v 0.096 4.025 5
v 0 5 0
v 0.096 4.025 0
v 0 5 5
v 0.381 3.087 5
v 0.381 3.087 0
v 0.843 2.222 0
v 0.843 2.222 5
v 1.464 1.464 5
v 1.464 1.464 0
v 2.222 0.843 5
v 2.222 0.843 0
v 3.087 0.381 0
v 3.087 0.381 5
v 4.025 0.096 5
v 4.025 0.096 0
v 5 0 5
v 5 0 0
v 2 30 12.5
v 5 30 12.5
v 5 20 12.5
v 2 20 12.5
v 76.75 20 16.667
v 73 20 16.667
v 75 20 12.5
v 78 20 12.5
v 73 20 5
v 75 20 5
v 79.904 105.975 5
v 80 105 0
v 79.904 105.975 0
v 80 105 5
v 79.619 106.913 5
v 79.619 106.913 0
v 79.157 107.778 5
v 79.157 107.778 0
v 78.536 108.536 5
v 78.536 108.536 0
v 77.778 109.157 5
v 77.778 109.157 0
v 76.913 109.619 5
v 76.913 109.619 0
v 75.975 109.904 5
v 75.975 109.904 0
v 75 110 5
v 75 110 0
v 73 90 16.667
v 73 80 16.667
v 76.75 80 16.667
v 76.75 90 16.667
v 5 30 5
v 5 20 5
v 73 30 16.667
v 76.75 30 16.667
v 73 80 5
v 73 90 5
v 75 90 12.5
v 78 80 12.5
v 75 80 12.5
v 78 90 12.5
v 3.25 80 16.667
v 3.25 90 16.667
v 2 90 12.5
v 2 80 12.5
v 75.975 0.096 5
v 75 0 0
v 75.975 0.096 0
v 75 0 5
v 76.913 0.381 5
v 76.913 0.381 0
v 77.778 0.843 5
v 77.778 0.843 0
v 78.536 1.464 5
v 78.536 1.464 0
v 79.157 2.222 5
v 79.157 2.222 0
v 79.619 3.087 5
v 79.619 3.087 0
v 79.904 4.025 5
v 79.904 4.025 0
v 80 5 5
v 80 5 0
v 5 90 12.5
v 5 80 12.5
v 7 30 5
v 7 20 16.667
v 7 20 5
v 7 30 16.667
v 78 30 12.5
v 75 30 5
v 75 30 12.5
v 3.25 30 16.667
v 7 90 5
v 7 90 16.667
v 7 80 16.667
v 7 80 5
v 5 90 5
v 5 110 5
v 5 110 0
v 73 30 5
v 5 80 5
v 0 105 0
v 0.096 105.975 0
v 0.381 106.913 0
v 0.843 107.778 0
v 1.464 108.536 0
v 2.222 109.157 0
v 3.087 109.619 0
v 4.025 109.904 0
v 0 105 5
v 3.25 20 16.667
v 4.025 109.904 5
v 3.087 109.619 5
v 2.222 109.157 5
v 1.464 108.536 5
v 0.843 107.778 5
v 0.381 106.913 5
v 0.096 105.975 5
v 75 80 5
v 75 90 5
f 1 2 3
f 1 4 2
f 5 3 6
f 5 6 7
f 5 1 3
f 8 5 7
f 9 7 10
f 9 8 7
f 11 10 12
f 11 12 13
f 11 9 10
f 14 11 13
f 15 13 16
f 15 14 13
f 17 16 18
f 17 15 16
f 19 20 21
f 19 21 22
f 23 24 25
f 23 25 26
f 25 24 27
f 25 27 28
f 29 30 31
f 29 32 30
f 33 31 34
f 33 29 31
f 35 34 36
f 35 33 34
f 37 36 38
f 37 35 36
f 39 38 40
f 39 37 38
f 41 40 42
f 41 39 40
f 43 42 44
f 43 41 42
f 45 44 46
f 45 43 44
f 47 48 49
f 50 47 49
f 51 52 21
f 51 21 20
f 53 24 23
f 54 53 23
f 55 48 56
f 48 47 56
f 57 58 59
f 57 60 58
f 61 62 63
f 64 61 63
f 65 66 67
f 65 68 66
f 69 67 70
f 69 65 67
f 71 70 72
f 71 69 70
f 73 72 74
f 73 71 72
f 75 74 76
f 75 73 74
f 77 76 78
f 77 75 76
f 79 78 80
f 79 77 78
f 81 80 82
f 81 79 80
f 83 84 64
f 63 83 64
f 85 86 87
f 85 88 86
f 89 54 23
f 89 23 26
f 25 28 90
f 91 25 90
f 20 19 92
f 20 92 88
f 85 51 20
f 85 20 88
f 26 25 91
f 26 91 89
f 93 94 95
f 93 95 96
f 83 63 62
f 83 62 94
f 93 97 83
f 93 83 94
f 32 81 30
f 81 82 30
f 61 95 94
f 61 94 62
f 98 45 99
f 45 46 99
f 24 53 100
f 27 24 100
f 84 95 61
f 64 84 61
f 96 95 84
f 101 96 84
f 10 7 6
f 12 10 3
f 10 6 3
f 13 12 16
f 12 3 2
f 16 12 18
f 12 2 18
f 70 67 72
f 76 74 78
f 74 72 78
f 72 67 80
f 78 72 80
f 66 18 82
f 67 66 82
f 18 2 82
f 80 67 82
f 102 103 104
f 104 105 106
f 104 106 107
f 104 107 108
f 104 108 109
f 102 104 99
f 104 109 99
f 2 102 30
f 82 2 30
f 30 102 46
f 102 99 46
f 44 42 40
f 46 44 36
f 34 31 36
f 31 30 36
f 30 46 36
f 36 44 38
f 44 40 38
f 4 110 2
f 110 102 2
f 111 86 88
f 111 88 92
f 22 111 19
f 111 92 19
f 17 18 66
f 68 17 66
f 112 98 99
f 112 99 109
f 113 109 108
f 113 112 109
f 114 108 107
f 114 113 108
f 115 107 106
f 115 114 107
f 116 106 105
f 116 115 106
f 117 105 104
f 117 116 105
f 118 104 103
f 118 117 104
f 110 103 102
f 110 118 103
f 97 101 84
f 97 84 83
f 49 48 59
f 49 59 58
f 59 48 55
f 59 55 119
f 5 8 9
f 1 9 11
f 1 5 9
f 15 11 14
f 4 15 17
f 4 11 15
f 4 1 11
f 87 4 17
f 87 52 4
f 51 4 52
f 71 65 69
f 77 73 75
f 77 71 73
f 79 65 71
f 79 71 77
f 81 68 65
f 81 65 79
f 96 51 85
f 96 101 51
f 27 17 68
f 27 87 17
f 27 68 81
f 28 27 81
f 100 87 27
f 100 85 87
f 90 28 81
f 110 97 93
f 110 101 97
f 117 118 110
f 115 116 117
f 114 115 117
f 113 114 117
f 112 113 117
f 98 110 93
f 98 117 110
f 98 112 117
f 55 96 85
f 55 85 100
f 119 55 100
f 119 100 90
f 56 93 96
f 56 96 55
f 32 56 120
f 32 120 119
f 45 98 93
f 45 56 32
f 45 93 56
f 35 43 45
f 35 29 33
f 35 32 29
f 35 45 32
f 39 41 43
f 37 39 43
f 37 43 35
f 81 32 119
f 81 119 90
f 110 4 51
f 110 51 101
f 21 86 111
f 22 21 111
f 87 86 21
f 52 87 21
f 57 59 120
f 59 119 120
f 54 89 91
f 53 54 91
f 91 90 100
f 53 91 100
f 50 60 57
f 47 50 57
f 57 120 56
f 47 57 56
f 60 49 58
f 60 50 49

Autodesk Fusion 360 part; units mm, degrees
sketch "Sketch1" plane through (0, 0, 0) normal (0, 0, 1) x (1, 0, 0)
  line L0 (0, 0) -> (80, 0)
  line L1 (80, 0) -> (80, 110)
  line L2 (80, 110) -> (0, 110)
  line L3 (0, 110) -> (0, 0)
  dimension "d1" = 80
  dimension "d2" = 110
extrude "Extrude1" add sketch "Sketch1" along normal blind 5
fillet "Fillet1" radius 5 4 edges at (80, 0, 2.5) (0, 0, 2.5) (80, 110, 2.5) (0, 110, 2.5)
sketch "Sketch2" plane through (0, 0, 5) normal (0, 0, 1) x (-1, 0, 0)
  arc A0 (-5, -110) -> (0, -105) centre (-5, -105) ccw
  line L0 (0, -105) -> (0, -5)
  arc A1 (0, -5) -> (-5, 0) centre (-5, -5) ccw
  line L1 (-5, 0) -> (-75, 0)
  arc A2 (-75, 0) -> (-80, -5) centre (-75, -5) ccw
  line L2 (-80, -5) -> (-80, -105)
  arc A3 (-80, -105) -> (-75, -110) centre (-75, -105) ccw
  line L3 (-75, -110) -> (-5, -110)
  line L4 (-5, -30) -> (-8, -30)
  line L5 (-8, -30) -> (-8, -20)
  line L6 (-8, -20) -> (-5, -20)
  line L7 (-5, -20) -> (-5, -30)
  line L8 (-5, -90) -> (-8, -90)
  line L9 (-8, -90) -> (-8, -80)
  line L10 (-8, -80) -> (-5, -80)
  line L11 (-5, -80) -> (-5, -90)
  line L12 (0, 0) -> (-40, 0)
  line L13 (-40, 0) -> (-40, -110)
  line L14 (-75, -90) -> (-72, -90)
  line L15 (-72, -90) -> (-72, -80)
  line L16 (-75, -80) -> (-75, -90)
  line L17 (-72, -80) -> (-75, -80)
  line L18 (-75, -30) -> (-72, -30)
  line L19 (-72, -20) -> (-75, -20)
  line L20 (-75, -20) -> (-75, -30)
  line L21 (-72, -30) -> (-72, -20)
  dimension "d7" = 3
  dimension "d8" = 10
  dimension "d9" = 3
  dimension "d10" = 10
  dimension "d11" = 5
  dimension "d12" = 5
  dimension "d13" = 20
  dimension "d14" = 20
  dimension "d15" = 40
extrude "Extrude2" add sketch "Sketch2" along normal blind 7.5 contours L4 L5 L6 L7 | L8 L9 L10 L11 | L14 L15 L16 L17 | L18 L19 L20 L21
sketch "Sketch3" plane through (0, 20, 0) normal (0, -1, 0) x (1, 0, 0)
  line L0 (5, 5) -> (8, 5)
  line L1 (8, 5) -> (8, 12.5)
  line L2 (8, 12.5) -> (5, 12.5)
  line L3 (5, 12.5) -> (5, 5)
  line L4 (5, 12.5) -> (2, 12.5)
  line L5 (8, 12.5) -> (8, 17.5)
  line L6 (8, 17.5) -> (2, 12.5)
  line L7 (72, 12.5) -> (72, 17.5)
  line L8 (75, 12.5) -> (78, 12.5)
  line L9 (72, 17.5) -> (78, 12.5)
  line L10 (72, 12.5) -> (75, 12.5)
  dimension "d18" = 5
  dimension "d48" = 3
  dimension "d54" = 5
  dimension "d55" = 3
extrude "Extrude3" add sketch "Sketch3" against normal blind 10 contours L2 L4 L5 L6 | L7 L8 L9 L10
sketch "Sketch4" plane through (0, 90, 0) normal (0, 1, 0) x (-1, 0, 0)
  line L0 (-75, 5) -> (-72, 5)
  line L1 (-72, 5) -> (-72, 12.5)
  line L2 (-72, 12.5) -> (-75, 12.5)
  line L3 (-75, 12.5) -> (-75, 5)
  line L4 (-78, 12.5) -> (-72, 17.5)
  line L5 (-72, 17.5) -> (-72, 12.5)
  line L6 (-78, 12.5) -> (-75, 12.5)
  line L7 (-8, 12.5) -> (-5, 12.5)
  line L8 (-5, 12.5) -> (-2, 12.5)
  line L9 (-8, 12.5) -> (-8, 17.5)
  line L10 (-8, 17.5) -> (-2, 12.5)
  dimension "d42" = 5
  dimension "d43" = 3
  dimension "d46" = 3
  dimension "d47" = 3
  dimension "d52" = 5
extrude "Extrude4" add sketch "Sketch4" against normal blind 10 contours L2 L4 L5 L6 | L7 L8 L9 L10
sketch "Sketch9" plane through (0, 90, 0) normal (0, 1, 0) x (-1, 0, 0)
  line L0 (-75, 5) -> (-72, 5)
  line L1 (-72, 5) -> (-72, 17.5)
  line L2 (-72, 17.5) -> (-78, 12.5)
  line L3 (-78, 12.5) -> (-75, 12.5)
  line L4 (-75, 12.5) -> (-75, 5)
  line L5 (-72, 17.5) -> (-76.5, 17.5)
  line L6 (-76.5, 17.5) -> (-78, 12.5)
  line L7 (-72, 17.5) -> (-73, 17.5)
  line L8 (-73, 17.5) -> (-73, 5)
  line L9 (-73, 5) -> (-72, 5)
  line L10 (-72, 5) -> (-72, 17.5)
  line L11 (-73, 16.6667) -> (-76.75, 16.6667)
  dimension "d56" = 4.5
  dimension "d57" = 1
sketch "Sketch10" plane through (0, 90, 0) normal (0, 1, 0) x (-1, 0, 0)
  line L0 (-8, 5) -> (-5, 5)
  line L1 (-5, 5) -> (-5, 12.5)
  line L2 (-5, 12.5) -> (-2, 12.5)
  line L3 (-2, 12.5) -> (-8, 17.5)
  line L4 (-8, 17.5) -> (-8, 5)
  line L5 (-8, 17.5) -> (-3.5, 17.5)
  line L6 (-3.5, 17.5) -> (-2, 12.5)
  line L7 (-8, 17.5) -> (-7, 17.5)
  line L8 (-7, 17.5) -> (-7, 5)
  line L9 (-7, 5) -> (-8, 5)
  line L10 (-8, 5) -> (-8, 17.5)
  line L11 (-7, 16.6667) -> (-3.25, 16.6667)
  dimension "d58" = 4.5
  dimension "d59" = 1
extrude "Extrude8" cut sketch "Sketch10" sketch "Sketch9" against normal blind 70 contours L0 L3 L4 L8 L9 L10 | L3 L5 L7 L8 of sketch 2 contours L0 L1 L2 L8 L9 L10 | L2 L5 L7 L8
extrude "Extrude9" add sketch "Sketch10" sketch "Sketch9" against normal blind 70 contours L3 L6 L11 of sketch 2 contours L2 L6 L11
sketch "Sketch11" plane through (0, 0, 0) normal (-1, 0, 0) x (0, -1, 0)
  line L0 (-105, 5) -> (-105, 0)
  line L1 (-105, 0) -> (-5, 0)
  line L2 (-5, 0) -> (-5, 5)
  line L3 (-5, 5) -> (-105, 5)
  line L4 (-110, 5) -> (-80, 5)
  line L5 (-80, 5) -> (-30, 5)
  line L6 (-30, 5) -> (-30, 26)
  line L7 (-30, 26) -> (-80, 26)
  line L8 (-80, 26) -> (-80, 5)
  dimension "d64" = 50
extrude "Extrude10" cut sketch "Sketch11" against normal blind 100 contours L3 L5 L6 L7 L8
